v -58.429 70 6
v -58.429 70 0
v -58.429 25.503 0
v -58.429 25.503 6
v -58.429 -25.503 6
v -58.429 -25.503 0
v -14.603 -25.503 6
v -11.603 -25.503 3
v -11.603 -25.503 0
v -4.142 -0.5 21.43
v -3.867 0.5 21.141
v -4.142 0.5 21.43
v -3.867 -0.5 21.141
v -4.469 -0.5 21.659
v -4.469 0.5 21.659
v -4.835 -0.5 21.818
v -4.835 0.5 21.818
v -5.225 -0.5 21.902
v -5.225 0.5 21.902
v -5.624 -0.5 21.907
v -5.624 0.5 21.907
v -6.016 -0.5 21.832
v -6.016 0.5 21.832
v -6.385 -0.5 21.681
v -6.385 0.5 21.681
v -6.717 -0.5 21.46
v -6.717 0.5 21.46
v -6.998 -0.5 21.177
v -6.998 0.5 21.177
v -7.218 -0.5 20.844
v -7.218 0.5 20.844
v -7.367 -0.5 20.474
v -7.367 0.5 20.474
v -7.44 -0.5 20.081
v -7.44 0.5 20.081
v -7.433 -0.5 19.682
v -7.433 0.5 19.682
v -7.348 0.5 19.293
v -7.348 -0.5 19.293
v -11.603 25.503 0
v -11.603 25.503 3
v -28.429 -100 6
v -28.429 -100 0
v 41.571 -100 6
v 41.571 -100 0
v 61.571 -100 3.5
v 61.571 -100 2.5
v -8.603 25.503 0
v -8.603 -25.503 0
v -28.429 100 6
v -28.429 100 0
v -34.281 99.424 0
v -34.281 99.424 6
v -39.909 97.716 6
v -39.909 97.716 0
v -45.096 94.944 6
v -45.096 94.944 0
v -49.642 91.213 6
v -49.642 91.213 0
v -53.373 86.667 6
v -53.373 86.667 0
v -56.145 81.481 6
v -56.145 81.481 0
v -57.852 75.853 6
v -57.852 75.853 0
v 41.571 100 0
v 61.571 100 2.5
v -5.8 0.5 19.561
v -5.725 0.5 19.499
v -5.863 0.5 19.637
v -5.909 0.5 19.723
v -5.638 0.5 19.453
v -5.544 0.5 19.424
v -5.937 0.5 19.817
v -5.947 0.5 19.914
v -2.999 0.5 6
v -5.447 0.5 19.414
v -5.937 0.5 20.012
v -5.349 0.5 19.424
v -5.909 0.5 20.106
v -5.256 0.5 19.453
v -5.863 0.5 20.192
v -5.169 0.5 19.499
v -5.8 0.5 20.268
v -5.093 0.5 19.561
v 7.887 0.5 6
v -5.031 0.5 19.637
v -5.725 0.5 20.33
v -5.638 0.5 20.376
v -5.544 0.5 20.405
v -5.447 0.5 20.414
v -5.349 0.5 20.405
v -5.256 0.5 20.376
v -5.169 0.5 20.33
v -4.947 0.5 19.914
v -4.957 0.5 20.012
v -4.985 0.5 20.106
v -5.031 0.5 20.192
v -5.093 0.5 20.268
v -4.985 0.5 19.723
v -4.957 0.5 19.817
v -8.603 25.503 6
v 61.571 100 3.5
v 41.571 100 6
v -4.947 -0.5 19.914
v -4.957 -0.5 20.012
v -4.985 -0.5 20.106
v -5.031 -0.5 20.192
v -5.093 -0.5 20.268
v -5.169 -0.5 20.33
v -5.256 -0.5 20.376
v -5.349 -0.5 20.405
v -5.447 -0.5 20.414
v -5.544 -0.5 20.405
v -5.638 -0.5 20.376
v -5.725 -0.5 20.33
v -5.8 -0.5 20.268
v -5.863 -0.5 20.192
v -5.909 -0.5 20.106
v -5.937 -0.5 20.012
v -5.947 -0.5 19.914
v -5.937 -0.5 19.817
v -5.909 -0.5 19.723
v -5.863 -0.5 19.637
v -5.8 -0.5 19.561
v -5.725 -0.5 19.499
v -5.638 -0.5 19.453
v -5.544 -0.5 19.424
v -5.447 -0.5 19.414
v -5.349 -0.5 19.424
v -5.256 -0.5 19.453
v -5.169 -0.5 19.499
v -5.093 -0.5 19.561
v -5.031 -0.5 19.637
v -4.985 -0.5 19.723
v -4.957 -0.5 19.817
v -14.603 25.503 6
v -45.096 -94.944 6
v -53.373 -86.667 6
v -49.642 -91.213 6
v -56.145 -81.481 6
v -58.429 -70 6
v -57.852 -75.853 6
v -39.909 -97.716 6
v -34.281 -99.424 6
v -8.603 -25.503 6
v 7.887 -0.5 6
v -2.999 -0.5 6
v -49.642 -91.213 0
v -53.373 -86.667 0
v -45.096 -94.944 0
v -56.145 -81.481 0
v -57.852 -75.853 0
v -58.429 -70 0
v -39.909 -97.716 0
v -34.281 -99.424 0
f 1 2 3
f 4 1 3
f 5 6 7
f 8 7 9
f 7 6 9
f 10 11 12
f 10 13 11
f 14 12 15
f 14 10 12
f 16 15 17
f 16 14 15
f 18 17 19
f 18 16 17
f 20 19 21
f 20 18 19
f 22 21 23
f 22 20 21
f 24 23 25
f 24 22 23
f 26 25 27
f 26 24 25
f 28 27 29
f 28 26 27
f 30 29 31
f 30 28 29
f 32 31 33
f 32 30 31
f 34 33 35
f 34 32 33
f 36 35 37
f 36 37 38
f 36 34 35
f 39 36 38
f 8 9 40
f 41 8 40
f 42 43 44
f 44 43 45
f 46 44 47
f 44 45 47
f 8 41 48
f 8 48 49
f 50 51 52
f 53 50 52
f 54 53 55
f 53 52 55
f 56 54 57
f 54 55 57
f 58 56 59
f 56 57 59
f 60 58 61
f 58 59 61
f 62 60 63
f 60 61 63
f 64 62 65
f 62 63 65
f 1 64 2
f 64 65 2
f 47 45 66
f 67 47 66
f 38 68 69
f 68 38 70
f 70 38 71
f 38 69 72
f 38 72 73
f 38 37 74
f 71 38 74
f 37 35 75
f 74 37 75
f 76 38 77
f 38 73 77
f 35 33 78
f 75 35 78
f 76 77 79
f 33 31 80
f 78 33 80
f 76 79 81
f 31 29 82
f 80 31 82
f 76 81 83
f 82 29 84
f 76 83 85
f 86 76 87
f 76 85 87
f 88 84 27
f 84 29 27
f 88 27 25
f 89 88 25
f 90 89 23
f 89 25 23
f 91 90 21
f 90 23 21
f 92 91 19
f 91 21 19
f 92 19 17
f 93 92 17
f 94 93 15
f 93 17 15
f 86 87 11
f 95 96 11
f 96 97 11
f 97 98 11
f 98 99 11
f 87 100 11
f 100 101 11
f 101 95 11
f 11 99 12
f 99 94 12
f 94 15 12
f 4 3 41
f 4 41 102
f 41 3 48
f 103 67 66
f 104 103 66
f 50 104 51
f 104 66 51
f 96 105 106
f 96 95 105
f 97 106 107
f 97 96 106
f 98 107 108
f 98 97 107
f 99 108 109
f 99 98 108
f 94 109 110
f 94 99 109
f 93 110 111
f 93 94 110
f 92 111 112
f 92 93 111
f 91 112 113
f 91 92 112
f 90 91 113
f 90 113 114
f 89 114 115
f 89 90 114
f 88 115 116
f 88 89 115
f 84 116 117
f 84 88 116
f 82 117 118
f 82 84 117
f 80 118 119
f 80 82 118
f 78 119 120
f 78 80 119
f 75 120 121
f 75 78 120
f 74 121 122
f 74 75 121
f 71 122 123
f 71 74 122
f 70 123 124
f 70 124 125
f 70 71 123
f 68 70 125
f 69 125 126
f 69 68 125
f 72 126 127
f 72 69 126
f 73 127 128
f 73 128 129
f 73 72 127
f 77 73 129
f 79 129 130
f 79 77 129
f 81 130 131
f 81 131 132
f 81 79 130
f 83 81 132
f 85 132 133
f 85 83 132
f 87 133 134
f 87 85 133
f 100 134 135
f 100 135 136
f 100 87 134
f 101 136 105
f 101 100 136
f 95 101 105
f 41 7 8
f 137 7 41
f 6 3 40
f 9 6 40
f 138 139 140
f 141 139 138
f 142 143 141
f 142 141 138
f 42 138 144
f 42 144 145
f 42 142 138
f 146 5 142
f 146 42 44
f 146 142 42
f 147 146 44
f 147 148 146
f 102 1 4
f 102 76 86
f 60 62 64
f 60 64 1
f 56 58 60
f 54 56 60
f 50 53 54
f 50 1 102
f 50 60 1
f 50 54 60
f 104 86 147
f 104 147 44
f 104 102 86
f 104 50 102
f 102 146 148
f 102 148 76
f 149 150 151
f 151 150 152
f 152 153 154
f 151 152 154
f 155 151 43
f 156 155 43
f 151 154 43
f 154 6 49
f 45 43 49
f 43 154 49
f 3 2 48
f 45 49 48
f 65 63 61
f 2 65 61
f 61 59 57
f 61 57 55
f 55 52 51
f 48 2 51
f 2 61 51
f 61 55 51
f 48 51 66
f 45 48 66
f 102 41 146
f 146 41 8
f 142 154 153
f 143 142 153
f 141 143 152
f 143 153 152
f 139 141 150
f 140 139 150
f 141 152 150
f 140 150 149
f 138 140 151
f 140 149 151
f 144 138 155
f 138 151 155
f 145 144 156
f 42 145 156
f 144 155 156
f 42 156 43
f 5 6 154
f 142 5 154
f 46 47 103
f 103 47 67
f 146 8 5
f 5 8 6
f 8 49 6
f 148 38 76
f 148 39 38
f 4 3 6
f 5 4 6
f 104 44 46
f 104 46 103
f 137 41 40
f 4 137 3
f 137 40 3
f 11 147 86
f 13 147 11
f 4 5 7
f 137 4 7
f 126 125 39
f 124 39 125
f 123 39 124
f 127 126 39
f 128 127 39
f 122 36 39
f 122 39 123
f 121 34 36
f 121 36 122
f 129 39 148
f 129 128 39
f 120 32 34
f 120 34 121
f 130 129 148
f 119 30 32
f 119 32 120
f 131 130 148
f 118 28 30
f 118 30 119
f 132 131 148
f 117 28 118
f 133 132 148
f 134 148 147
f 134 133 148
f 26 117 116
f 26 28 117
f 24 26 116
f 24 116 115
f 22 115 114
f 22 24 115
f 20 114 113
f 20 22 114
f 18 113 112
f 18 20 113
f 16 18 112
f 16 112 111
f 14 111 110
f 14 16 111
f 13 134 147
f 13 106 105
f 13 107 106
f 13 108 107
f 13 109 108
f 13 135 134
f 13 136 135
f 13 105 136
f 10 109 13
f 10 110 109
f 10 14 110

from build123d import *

# Parameters (mm, degrees)
F1_DEPTH = 6
F2_SIZE2 = 20
F2_SIZE  = 2.5
F3_DEPTH = 6
F4_SIZE2 = 3
F4_SIZE  = 3
F5_SIZE2 = 3
F5_SIZE  = 3
F6_SIZE2 = 2.99999
F6_SIZE  = 2.99999
F7_R     = 0.5
F8_DEPTH = 0.5


# Not quite as in the source:
# - a fillet or chamfer is up to 0.001 mm smaller than in the source, because OpenCascade refuses the exact size


with BuildPart() as f1:
    # F0 (on Top) → F1 (new body)
    with BuildSketch(Plane.XY):
        with BuildLine():
            Line((61.5713464236, -100), (61.5713464236, 100))
            Line((61.5713464236, 100), (-28.4286535764, 100))
            ThreePointArc((-28.4286535764, 100), (-49.641857012, 91.2132034356), (-58.4286535764, 70))
            Line((-58.4286535764, 70), (-58.4286535764, 25.5028065294))
            Line((-58.4286535764, 25.5028065294), (-11.6032855585, 25.5028065294))
            Line((-11.6032855585, 25.5028065294), (-11.6032855585, 0))
            Line((-11.6032855585, 0), (-11.6032855585, -25.5028065294))
            Line((-11.6032855585, -25.5028065294), (-58.4286535764, -25.5028065294))
            Line((-58.4286535764, -25.5028065294), (-58.4286535764, -70))
            ThreePointArc((-58.4286535764, -70), (-49.641857012, -91.2132034356), (-28.4286535764, -100))
            Line((-28.4286535764, -100), (61.5713464236, -100))
        make_face()
    extrude(amount=F1_DEPTH)

    # F2
    f2_edges = [f1.edges().sort_by_distance(p)[0] for p in [
        (61.571346, 0, 6),
        (61.571346, 0, 0),
    ]]
    f2_side = f1.faces().sort_by_distance((61.571346, 0, 3))[0]
    chamfer(f2_edges, length=F2_SIZE, length2=F2_SIZE2, reference=f2_side)

    # F4
    f4_edges = [f1.edges().sort_by_distance(p)[0] for p in [
        (-11.603286, 0, 6),
    ]]
    chamfer(f4_edges, length=F4_SIZE, length2=F4_SIZE2)

    # F6 (size 3 and 3 in the source; OpenCascade refuses exactly that, so slightly less here)
    f6_edges = [f1.edges().sort_by_distance(p)[0] for p in [
        (-11.603286, 0, 0),
    ]]
    chamfer(f6_edges, length=F6_SIZE, length2=F6_SIZE2)

    # F7 (on Front) → F8 (join, symmetric)
    with BuildSketch(Plane.XZ):
        with BuildLine():
            Line((-7.3477944259, 19.2926249586), (-2.9993071221, 6))
            Line((-2.9993071221, 6), (7.8871631995, 6))
            Line((7.8871631995, 6), (-3.8671067929, 21.1409176701))
            ThreePointArc((-3.8671067929, 21.1409176701), (-3.5548827609, 20.5626830442), (-3.4469229787, 19.9144671741))
            ThreePointArc((-3.4469229787, 19.9144671741), (-5.1320761068, 17.9394047834), (-7.3477944259, 19.2926249586))
        make_face()
        with BuildLine():
            ThreePointArc((-3.8671067929, 21.1409176701), (-6.3849078437, 21.6808715426), (-7.3477944259, 19.2926249586))
            ThreePointArc((-7.3477944259, 19.2926249586), (-5.1320761068, 17.9394047834), (-3.4469229787, 19.9144671741))
            ThreePointArc((-3.4469229787, 19.9144671741), (-3.5548827609, 20.5626830442), (-3.8671067929, 21.1409176701))
        make_face()
        with Locations((-5.4469229787, 19.9144671741)):
            Circle(F7_R, mode=Mode.SUBTRACT)
    extrude(amount=F8_DEPTH, both=True)


with BuildPart() as f3:
    # F0 (on Top) → F3 (new body)
    with BuildSketch(Plane.XY):
        Polygon((-11.6032855585, 25.5028065294), (-58.4286535764, 25.5028065294), (-58.4286535764, 0), (-58.4286535764, -25.5028065294), (-11.6032855585, -25.5028065294), (-11.6032855585, 0), align=None)
    extrude(amount=F3_DEPTH)

    # F5
    f5_edges = [f3.edges().sort_by_distance(p)[0] for p in [
        (-11.603286, 0, 6),
    ]]
    chamfer(f5_edges, length=F5_SIZE, length2=F5_SIZE2)


solid = Compound([f1.part, f3.part])
